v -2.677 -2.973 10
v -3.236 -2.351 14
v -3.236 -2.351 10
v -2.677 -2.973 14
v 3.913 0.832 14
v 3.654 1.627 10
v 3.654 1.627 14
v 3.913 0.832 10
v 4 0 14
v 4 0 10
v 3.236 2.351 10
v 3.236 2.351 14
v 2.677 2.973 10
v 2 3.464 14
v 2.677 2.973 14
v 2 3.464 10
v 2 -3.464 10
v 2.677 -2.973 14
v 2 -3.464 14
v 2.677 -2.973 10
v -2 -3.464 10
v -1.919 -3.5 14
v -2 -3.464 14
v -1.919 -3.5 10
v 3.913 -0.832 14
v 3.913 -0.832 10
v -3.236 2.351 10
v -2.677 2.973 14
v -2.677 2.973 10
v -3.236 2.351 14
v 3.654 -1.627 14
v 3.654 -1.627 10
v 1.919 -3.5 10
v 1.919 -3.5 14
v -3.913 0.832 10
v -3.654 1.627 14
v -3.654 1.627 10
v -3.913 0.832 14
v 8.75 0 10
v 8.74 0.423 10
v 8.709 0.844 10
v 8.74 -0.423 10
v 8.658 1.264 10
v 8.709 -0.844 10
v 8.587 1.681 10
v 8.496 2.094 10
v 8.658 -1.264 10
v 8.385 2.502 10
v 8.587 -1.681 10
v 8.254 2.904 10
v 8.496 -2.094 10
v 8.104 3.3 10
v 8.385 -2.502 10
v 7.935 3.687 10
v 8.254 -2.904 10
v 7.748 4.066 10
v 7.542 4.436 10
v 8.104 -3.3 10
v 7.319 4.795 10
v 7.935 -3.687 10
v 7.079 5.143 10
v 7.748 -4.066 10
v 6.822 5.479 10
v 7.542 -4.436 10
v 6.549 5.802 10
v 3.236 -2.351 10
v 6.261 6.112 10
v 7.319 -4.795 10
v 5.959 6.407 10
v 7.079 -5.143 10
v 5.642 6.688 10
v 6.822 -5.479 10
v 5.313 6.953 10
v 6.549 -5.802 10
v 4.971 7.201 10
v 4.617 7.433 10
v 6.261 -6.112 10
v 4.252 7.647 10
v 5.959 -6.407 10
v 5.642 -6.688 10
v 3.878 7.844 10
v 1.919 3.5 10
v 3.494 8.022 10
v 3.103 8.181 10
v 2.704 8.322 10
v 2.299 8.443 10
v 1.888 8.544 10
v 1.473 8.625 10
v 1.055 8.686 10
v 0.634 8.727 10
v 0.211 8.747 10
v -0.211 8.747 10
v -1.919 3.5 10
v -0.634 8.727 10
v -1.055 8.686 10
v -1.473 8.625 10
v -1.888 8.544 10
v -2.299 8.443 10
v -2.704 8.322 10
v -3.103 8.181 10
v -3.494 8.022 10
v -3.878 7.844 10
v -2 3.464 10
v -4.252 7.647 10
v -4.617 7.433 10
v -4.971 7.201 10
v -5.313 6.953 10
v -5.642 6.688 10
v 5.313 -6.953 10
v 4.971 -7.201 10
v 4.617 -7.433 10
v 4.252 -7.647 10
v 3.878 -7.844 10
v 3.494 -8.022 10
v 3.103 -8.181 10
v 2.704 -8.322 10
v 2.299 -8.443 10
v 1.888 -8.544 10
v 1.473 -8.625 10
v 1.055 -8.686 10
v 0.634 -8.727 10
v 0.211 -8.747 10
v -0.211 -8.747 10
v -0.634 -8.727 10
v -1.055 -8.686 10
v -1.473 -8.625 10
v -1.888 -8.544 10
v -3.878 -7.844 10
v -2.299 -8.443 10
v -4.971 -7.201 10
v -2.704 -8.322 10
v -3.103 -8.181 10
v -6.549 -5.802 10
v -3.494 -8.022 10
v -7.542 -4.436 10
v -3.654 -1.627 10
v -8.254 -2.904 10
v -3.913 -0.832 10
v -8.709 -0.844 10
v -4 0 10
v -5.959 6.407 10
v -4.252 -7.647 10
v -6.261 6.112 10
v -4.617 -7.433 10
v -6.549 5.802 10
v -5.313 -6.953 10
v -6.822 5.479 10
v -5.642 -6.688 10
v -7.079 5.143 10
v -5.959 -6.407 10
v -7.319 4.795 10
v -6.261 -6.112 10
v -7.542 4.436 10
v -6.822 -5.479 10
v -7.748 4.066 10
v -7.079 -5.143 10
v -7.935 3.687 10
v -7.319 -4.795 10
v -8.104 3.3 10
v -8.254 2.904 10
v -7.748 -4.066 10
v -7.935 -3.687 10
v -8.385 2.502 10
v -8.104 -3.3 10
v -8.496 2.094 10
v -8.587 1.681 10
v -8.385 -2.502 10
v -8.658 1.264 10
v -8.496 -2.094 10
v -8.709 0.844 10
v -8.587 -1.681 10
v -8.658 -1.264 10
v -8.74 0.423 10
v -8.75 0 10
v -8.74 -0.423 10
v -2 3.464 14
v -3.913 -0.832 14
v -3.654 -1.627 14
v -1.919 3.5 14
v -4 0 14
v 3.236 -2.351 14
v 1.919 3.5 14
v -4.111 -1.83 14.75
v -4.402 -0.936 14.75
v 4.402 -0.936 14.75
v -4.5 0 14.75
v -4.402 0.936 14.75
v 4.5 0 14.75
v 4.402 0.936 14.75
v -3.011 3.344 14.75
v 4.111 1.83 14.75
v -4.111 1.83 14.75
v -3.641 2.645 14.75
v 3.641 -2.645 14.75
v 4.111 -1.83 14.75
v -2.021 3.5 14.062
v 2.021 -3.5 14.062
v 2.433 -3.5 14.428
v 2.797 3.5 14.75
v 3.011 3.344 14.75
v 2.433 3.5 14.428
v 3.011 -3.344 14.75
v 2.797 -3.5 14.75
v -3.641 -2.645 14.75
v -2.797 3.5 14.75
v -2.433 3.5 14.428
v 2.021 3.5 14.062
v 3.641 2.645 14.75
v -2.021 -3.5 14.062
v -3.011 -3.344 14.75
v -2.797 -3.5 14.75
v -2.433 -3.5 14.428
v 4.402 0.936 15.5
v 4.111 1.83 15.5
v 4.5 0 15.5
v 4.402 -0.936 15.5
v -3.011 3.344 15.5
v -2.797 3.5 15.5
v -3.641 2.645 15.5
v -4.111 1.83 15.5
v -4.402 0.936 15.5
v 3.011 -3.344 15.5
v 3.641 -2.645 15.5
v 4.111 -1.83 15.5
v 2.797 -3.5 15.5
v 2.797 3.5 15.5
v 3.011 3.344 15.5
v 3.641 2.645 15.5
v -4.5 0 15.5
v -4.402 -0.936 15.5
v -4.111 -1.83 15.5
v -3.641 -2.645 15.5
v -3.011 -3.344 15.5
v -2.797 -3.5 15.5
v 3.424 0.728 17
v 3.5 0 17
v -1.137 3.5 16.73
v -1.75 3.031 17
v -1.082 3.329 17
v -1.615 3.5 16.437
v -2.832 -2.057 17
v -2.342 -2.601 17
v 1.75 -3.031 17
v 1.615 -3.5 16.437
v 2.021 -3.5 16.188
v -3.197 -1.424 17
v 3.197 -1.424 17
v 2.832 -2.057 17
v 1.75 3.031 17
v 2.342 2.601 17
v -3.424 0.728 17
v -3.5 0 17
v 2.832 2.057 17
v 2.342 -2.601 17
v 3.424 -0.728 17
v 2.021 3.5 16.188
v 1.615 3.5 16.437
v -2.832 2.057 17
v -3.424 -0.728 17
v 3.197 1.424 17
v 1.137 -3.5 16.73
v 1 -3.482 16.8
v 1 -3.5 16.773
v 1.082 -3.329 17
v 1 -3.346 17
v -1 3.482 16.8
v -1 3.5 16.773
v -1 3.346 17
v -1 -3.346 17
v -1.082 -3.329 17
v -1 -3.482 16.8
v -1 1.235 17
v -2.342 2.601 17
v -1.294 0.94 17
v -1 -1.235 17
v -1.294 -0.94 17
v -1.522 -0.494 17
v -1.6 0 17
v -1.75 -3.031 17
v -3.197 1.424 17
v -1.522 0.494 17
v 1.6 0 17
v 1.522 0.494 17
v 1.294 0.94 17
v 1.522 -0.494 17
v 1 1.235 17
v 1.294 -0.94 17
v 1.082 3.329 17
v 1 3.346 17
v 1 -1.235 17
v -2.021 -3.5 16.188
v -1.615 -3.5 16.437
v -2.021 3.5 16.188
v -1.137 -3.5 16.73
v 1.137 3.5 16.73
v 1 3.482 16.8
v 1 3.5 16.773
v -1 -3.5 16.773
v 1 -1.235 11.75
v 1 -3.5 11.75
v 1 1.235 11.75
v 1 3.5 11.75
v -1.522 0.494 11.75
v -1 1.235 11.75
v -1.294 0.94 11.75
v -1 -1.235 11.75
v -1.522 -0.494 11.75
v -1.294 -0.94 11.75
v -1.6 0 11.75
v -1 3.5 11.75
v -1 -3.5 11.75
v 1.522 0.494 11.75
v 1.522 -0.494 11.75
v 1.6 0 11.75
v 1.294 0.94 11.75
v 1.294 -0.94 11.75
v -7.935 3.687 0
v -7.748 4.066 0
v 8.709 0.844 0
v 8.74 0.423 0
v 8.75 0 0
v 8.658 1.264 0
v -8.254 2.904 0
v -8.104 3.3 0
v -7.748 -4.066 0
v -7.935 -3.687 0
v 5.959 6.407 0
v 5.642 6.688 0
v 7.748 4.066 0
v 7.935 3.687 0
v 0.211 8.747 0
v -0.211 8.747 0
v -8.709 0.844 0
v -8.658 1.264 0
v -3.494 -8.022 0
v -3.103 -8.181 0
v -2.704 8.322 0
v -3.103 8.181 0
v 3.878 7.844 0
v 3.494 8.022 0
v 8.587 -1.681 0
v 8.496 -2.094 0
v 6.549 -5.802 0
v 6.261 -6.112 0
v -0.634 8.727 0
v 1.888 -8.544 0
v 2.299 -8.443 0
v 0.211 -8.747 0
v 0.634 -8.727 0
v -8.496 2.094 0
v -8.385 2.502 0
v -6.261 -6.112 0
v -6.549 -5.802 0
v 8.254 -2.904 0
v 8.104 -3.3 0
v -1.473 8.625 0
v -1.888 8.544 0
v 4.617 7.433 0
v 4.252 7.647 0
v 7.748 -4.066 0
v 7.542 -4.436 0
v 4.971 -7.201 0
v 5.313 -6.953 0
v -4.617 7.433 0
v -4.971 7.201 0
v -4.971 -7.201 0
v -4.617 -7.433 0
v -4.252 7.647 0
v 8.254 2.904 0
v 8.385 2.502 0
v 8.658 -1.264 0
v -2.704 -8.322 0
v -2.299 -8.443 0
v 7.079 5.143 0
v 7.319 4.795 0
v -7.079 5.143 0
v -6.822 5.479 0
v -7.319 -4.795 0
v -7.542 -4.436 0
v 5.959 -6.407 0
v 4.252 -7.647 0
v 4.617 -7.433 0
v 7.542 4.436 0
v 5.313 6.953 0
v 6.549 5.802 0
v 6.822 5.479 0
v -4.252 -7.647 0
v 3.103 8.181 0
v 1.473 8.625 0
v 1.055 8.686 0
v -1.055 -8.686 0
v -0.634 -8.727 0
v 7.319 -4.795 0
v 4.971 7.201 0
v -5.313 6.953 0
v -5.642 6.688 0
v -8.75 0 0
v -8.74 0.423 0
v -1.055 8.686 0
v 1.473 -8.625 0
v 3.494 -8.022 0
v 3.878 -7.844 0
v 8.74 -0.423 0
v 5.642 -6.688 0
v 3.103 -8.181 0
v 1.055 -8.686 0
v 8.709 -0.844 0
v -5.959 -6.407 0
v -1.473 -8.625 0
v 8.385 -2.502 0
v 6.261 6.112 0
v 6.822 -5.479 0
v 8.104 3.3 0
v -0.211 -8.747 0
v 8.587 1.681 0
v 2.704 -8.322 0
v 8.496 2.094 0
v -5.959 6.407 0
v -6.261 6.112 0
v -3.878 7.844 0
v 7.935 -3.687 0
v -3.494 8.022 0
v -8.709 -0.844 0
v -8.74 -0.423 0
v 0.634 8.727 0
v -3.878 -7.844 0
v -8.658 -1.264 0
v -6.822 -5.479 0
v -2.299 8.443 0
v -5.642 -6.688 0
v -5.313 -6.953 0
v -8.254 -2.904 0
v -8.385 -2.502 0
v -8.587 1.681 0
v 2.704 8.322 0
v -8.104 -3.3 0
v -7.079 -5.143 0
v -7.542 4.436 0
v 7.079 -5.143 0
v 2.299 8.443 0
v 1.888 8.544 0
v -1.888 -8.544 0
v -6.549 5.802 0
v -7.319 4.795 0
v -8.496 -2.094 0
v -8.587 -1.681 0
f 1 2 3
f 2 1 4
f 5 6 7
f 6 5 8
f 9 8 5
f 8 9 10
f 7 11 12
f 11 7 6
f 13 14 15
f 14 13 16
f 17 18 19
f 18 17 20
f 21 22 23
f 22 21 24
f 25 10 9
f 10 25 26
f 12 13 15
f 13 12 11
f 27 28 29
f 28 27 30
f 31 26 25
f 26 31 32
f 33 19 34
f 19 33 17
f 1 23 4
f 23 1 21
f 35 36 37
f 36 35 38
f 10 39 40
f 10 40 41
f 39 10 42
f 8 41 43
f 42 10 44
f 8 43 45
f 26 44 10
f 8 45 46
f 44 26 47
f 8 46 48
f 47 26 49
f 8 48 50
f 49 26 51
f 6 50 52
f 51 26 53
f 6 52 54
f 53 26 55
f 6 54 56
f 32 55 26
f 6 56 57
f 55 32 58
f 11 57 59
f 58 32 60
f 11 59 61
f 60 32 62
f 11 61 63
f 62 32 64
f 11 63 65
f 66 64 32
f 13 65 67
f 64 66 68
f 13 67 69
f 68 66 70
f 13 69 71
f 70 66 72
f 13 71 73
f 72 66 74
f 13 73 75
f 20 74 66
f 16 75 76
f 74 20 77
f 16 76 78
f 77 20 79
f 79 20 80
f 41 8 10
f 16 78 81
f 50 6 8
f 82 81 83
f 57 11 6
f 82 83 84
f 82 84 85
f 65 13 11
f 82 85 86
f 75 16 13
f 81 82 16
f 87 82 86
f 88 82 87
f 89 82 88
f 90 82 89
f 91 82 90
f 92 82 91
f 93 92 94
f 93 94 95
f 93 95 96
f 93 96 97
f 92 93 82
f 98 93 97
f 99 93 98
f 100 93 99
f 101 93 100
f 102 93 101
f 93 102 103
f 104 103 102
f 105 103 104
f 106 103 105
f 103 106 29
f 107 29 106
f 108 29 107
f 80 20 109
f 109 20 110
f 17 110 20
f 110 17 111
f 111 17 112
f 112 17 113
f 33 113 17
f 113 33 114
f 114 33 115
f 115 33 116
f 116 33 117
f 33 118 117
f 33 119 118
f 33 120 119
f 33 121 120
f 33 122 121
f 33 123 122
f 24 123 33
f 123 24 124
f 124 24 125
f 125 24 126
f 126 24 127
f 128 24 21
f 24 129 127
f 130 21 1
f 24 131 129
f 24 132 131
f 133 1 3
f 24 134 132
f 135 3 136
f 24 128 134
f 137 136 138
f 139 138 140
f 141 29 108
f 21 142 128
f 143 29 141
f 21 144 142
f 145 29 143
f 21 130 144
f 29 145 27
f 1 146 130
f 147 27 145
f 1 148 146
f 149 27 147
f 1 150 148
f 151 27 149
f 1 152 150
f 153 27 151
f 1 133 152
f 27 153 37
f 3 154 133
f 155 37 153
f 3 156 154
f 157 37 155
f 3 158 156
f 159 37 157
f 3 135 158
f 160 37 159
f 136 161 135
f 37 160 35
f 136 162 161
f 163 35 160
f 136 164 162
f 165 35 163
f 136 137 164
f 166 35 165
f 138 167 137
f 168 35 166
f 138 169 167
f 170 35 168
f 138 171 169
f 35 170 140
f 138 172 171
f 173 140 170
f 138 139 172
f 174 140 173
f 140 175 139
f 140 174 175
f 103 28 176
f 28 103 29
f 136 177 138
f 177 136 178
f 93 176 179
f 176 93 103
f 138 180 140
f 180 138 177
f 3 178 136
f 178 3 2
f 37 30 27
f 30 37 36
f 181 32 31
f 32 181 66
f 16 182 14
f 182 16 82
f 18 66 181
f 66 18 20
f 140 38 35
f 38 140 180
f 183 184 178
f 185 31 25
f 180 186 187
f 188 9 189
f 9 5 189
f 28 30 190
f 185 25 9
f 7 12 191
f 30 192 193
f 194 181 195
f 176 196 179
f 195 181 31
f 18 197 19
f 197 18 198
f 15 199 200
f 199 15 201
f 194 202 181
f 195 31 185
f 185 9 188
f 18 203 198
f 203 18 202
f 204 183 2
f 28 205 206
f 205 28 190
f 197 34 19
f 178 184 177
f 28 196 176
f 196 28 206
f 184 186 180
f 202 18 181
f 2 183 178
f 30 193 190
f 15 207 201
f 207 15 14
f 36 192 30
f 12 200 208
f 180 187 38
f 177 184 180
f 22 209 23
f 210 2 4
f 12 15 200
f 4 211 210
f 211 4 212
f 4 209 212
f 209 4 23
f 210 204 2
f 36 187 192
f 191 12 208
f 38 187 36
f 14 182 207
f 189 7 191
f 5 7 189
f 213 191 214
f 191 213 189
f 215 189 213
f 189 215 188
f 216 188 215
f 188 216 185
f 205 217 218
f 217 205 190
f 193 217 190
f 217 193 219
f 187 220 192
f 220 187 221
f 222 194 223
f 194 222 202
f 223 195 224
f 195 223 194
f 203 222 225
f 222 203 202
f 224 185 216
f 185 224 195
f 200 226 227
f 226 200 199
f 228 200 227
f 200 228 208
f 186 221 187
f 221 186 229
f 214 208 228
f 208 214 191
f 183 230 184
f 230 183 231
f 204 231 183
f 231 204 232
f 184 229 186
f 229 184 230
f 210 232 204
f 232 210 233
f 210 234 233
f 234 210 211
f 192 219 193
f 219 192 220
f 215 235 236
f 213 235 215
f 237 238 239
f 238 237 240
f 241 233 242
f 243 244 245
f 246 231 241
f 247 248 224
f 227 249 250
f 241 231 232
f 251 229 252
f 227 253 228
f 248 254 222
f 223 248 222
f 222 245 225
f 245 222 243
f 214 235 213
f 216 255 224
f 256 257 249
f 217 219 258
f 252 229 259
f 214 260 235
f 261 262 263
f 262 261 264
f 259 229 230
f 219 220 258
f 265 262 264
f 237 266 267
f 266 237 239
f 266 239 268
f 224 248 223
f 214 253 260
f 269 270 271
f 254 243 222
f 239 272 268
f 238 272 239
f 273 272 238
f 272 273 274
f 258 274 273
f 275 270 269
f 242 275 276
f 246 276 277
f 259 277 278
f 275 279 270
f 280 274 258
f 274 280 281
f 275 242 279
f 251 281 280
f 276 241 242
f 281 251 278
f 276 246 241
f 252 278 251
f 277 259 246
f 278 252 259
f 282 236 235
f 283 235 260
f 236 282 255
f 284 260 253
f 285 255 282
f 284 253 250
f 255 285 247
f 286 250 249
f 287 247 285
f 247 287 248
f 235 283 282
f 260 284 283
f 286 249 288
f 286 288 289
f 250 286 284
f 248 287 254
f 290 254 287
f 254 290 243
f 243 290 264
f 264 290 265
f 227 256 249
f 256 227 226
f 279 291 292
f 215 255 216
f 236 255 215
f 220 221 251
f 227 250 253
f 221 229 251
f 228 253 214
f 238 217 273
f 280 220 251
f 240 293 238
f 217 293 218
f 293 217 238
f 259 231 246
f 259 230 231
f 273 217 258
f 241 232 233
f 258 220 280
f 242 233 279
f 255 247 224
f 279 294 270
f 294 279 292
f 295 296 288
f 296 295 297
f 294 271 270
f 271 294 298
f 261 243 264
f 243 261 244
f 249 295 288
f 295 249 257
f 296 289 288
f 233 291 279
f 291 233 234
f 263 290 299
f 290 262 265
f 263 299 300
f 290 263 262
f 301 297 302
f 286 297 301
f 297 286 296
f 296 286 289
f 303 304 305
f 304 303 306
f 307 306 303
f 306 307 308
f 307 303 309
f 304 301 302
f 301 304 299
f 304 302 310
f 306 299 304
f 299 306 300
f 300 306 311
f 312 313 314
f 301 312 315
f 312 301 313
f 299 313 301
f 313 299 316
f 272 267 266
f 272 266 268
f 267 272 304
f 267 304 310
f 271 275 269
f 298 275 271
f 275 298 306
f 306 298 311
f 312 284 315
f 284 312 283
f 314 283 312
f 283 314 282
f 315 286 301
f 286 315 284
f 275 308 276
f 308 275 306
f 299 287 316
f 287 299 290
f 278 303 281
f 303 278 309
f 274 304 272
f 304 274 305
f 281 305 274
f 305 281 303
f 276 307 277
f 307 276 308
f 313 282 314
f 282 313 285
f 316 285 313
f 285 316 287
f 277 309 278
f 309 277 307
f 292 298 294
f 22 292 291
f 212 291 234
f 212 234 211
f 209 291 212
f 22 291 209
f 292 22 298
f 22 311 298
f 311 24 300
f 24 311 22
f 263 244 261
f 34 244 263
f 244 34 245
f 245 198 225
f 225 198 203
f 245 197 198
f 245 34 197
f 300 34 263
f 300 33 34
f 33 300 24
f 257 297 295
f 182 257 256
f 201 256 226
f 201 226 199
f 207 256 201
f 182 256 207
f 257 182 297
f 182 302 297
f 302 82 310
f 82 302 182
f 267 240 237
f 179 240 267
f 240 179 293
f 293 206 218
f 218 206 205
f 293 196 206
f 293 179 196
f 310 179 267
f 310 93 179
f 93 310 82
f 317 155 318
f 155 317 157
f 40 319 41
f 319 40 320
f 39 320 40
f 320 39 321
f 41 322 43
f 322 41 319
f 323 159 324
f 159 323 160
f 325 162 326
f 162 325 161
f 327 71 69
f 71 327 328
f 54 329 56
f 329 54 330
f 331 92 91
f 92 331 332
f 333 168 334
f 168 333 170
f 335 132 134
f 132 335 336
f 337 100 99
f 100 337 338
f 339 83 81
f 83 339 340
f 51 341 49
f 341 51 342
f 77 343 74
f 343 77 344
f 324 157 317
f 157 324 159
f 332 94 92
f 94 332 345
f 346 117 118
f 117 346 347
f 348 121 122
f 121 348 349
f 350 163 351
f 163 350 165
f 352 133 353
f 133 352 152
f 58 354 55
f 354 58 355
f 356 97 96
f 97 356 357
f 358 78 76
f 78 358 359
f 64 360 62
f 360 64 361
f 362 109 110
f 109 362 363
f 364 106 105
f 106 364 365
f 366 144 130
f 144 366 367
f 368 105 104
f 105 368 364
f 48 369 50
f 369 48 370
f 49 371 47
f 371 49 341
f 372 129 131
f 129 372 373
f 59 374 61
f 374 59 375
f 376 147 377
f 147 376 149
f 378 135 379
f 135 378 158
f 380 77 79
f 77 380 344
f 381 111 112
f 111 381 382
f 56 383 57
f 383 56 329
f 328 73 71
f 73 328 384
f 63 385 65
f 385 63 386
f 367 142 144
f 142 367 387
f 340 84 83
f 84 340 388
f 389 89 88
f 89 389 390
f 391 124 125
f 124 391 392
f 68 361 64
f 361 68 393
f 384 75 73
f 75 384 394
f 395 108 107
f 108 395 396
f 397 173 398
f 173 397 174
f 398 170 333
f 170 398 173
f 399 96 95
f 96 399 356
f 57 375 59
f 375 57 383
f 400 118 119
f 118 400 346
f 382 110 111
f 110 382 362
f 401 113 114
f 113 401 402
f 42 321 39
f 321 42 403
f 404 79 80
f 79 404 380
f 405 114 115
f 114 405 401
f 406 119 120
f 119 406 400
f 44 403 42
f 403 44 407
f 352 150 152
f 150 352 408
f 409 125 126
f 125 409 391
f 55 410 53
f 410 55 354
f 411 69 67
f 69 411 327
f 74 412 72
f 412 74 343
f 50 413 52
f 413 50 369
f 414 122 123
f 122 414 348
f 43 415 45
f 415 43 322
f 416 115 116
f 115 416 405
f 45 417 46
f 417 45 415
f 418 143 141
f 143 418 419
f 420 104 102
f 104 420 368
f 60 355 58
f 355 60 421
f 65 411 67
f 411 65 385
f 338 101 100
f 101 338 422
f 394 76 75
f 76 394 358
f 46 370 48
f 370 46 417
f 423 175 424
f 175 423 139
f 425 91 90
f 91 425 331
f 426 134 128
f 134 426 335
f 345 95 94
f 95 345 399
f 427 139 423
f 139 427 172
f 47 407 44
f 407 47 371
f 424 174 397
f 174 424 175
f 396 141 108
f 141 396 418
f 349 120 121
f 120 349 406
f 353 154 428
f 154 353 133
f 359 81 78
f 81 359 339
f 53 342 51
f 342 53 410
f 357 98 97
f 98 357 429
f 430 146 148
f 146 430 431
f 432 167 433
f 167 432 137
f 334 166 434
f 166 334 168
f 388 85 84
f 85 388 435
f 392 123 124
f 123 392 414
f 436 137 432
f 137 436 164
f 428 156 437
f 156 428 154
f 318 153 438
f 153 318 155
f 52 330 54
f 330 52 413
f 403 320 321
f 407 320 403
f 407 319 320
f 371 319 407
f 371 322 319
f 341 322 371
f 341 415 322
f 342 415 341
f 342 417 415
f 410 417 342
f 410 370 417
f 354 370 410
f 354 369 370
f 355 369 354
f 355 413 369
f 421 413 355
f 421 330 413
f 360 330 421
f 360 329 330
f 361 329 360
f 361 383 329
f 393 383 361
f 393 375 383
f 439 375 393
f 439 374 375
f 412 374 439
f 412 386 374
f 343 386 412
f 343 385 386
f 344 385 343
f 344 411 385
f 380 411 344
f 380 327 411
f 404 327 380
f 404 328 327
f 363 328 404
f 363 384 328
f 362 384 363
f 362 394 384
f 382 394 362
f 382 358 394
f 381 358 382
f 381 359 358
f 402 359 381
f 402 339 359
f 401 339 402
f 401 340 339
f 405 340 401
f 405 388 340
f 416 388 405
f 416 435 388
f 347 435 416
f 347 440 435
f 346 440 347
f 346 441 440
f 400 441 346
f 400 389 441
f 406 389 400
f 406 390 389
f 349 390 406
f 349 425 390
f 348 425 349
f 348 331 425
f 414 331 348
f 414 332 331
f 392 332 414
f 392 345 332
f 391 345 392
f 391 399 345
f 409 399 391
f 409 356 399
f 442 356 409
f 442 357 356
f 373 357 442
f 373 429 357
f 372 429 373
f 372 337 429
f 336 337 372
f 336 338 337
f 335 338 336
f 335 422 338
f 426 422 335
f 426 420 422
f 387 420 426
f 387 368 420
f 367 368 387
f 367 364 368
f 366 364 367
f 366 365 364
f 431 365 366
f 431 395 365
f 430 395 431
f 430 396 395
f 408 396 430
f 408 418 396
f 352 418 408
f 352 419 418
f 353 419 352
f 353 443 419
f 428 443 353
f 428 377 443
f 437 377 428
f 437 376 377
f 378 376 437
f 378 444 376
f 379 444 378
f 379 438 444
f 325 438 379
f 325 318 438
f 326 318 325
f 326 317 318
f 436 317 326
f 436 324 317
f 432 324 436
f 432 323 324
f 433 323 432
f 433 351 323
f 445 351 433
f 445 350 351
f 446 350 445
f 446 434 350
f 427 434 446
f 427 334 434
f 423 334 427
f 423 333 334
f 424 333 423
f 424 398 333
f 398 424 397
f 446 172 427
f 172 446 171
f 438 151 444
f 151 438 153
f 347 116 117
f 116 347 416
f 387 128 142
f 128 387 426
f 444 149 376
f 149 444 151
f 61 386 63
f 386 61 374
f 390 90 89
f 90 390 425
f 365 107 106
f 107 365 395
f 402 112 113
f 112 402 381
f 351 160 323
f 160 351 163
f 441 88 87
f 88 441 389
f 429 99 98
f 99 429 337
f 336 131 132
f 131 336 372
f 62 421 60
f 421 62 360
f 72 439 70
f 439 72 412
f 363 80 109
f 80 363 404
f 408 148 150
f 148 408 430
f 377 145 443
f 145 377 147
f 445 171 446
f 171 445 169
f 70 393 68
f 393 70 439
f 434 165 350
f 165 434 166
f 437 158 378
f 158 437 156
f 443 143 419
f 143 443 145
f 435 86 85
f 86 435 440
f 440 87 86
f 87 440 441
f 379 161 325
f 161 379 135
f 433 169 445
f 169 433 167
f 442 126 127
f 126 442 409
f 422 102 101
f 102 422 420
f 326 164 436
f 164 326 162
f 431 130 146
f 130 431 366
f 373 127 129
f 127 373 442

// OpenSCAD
$fn=130;

pinR=8.75;      //Zylinder-Radius
pinH=10;        //Zylinder-Höhe
pintack(h=7);   //Pin-Höhe


module pin(h=10, r=4, lh=3, lt=1) { 
    pin_vertical(h, r, lh, lt);
}

module pintack(h=10, r=4, lh=3, lt=1, bh=pinH, br=pinR) {
   union() {
    cylinder(h=bh, r=br);
    translate([0, 0, bh]) pin(h, r, lh, lt);
  }
}

module pin_vertical(h=10, r=4, lh=3, lt=1) {

  difference() {
    pin_solid(h, r, lh, lt);
    translate([-r*0.5/2, -(r*2+lt*2)/2, h/4]) cube([r*0.5, r*2+lt*2, h]);
    translate([0, 0, h/4]) cylinder(h=h+lh, r=r/2.5, $fn=20);
    translate([-r*2, -lt-r*1.125, -1]) cube([r*4, lt*2, h+2]);
    translate([-r*2, -lt+r*1.125, -1]) cube([r*4, lt*2, h+2]);
  }
}

module pin_solid(h=10, r=4, lh=3, lt=1) {
  union() {

    cylinder(h=h-lh, r=r, $fn=30);
    translate([0, 0, h-lh]) cylinder(h=lh*0.25, r1=r, r2=r+(lt/2), $fn=30);
    translate([0, 0, h-lh+lh*0.25]) cylinder(h=lh*0.25, r=r+(lt/2), $fn=30);    
    translate([0, 0, h-lh+lh*0.50]) cylinder(h=lh*0.50, r1=r+(lt/2), r2=r-(lt/2), $fn=30);    
  }
}
